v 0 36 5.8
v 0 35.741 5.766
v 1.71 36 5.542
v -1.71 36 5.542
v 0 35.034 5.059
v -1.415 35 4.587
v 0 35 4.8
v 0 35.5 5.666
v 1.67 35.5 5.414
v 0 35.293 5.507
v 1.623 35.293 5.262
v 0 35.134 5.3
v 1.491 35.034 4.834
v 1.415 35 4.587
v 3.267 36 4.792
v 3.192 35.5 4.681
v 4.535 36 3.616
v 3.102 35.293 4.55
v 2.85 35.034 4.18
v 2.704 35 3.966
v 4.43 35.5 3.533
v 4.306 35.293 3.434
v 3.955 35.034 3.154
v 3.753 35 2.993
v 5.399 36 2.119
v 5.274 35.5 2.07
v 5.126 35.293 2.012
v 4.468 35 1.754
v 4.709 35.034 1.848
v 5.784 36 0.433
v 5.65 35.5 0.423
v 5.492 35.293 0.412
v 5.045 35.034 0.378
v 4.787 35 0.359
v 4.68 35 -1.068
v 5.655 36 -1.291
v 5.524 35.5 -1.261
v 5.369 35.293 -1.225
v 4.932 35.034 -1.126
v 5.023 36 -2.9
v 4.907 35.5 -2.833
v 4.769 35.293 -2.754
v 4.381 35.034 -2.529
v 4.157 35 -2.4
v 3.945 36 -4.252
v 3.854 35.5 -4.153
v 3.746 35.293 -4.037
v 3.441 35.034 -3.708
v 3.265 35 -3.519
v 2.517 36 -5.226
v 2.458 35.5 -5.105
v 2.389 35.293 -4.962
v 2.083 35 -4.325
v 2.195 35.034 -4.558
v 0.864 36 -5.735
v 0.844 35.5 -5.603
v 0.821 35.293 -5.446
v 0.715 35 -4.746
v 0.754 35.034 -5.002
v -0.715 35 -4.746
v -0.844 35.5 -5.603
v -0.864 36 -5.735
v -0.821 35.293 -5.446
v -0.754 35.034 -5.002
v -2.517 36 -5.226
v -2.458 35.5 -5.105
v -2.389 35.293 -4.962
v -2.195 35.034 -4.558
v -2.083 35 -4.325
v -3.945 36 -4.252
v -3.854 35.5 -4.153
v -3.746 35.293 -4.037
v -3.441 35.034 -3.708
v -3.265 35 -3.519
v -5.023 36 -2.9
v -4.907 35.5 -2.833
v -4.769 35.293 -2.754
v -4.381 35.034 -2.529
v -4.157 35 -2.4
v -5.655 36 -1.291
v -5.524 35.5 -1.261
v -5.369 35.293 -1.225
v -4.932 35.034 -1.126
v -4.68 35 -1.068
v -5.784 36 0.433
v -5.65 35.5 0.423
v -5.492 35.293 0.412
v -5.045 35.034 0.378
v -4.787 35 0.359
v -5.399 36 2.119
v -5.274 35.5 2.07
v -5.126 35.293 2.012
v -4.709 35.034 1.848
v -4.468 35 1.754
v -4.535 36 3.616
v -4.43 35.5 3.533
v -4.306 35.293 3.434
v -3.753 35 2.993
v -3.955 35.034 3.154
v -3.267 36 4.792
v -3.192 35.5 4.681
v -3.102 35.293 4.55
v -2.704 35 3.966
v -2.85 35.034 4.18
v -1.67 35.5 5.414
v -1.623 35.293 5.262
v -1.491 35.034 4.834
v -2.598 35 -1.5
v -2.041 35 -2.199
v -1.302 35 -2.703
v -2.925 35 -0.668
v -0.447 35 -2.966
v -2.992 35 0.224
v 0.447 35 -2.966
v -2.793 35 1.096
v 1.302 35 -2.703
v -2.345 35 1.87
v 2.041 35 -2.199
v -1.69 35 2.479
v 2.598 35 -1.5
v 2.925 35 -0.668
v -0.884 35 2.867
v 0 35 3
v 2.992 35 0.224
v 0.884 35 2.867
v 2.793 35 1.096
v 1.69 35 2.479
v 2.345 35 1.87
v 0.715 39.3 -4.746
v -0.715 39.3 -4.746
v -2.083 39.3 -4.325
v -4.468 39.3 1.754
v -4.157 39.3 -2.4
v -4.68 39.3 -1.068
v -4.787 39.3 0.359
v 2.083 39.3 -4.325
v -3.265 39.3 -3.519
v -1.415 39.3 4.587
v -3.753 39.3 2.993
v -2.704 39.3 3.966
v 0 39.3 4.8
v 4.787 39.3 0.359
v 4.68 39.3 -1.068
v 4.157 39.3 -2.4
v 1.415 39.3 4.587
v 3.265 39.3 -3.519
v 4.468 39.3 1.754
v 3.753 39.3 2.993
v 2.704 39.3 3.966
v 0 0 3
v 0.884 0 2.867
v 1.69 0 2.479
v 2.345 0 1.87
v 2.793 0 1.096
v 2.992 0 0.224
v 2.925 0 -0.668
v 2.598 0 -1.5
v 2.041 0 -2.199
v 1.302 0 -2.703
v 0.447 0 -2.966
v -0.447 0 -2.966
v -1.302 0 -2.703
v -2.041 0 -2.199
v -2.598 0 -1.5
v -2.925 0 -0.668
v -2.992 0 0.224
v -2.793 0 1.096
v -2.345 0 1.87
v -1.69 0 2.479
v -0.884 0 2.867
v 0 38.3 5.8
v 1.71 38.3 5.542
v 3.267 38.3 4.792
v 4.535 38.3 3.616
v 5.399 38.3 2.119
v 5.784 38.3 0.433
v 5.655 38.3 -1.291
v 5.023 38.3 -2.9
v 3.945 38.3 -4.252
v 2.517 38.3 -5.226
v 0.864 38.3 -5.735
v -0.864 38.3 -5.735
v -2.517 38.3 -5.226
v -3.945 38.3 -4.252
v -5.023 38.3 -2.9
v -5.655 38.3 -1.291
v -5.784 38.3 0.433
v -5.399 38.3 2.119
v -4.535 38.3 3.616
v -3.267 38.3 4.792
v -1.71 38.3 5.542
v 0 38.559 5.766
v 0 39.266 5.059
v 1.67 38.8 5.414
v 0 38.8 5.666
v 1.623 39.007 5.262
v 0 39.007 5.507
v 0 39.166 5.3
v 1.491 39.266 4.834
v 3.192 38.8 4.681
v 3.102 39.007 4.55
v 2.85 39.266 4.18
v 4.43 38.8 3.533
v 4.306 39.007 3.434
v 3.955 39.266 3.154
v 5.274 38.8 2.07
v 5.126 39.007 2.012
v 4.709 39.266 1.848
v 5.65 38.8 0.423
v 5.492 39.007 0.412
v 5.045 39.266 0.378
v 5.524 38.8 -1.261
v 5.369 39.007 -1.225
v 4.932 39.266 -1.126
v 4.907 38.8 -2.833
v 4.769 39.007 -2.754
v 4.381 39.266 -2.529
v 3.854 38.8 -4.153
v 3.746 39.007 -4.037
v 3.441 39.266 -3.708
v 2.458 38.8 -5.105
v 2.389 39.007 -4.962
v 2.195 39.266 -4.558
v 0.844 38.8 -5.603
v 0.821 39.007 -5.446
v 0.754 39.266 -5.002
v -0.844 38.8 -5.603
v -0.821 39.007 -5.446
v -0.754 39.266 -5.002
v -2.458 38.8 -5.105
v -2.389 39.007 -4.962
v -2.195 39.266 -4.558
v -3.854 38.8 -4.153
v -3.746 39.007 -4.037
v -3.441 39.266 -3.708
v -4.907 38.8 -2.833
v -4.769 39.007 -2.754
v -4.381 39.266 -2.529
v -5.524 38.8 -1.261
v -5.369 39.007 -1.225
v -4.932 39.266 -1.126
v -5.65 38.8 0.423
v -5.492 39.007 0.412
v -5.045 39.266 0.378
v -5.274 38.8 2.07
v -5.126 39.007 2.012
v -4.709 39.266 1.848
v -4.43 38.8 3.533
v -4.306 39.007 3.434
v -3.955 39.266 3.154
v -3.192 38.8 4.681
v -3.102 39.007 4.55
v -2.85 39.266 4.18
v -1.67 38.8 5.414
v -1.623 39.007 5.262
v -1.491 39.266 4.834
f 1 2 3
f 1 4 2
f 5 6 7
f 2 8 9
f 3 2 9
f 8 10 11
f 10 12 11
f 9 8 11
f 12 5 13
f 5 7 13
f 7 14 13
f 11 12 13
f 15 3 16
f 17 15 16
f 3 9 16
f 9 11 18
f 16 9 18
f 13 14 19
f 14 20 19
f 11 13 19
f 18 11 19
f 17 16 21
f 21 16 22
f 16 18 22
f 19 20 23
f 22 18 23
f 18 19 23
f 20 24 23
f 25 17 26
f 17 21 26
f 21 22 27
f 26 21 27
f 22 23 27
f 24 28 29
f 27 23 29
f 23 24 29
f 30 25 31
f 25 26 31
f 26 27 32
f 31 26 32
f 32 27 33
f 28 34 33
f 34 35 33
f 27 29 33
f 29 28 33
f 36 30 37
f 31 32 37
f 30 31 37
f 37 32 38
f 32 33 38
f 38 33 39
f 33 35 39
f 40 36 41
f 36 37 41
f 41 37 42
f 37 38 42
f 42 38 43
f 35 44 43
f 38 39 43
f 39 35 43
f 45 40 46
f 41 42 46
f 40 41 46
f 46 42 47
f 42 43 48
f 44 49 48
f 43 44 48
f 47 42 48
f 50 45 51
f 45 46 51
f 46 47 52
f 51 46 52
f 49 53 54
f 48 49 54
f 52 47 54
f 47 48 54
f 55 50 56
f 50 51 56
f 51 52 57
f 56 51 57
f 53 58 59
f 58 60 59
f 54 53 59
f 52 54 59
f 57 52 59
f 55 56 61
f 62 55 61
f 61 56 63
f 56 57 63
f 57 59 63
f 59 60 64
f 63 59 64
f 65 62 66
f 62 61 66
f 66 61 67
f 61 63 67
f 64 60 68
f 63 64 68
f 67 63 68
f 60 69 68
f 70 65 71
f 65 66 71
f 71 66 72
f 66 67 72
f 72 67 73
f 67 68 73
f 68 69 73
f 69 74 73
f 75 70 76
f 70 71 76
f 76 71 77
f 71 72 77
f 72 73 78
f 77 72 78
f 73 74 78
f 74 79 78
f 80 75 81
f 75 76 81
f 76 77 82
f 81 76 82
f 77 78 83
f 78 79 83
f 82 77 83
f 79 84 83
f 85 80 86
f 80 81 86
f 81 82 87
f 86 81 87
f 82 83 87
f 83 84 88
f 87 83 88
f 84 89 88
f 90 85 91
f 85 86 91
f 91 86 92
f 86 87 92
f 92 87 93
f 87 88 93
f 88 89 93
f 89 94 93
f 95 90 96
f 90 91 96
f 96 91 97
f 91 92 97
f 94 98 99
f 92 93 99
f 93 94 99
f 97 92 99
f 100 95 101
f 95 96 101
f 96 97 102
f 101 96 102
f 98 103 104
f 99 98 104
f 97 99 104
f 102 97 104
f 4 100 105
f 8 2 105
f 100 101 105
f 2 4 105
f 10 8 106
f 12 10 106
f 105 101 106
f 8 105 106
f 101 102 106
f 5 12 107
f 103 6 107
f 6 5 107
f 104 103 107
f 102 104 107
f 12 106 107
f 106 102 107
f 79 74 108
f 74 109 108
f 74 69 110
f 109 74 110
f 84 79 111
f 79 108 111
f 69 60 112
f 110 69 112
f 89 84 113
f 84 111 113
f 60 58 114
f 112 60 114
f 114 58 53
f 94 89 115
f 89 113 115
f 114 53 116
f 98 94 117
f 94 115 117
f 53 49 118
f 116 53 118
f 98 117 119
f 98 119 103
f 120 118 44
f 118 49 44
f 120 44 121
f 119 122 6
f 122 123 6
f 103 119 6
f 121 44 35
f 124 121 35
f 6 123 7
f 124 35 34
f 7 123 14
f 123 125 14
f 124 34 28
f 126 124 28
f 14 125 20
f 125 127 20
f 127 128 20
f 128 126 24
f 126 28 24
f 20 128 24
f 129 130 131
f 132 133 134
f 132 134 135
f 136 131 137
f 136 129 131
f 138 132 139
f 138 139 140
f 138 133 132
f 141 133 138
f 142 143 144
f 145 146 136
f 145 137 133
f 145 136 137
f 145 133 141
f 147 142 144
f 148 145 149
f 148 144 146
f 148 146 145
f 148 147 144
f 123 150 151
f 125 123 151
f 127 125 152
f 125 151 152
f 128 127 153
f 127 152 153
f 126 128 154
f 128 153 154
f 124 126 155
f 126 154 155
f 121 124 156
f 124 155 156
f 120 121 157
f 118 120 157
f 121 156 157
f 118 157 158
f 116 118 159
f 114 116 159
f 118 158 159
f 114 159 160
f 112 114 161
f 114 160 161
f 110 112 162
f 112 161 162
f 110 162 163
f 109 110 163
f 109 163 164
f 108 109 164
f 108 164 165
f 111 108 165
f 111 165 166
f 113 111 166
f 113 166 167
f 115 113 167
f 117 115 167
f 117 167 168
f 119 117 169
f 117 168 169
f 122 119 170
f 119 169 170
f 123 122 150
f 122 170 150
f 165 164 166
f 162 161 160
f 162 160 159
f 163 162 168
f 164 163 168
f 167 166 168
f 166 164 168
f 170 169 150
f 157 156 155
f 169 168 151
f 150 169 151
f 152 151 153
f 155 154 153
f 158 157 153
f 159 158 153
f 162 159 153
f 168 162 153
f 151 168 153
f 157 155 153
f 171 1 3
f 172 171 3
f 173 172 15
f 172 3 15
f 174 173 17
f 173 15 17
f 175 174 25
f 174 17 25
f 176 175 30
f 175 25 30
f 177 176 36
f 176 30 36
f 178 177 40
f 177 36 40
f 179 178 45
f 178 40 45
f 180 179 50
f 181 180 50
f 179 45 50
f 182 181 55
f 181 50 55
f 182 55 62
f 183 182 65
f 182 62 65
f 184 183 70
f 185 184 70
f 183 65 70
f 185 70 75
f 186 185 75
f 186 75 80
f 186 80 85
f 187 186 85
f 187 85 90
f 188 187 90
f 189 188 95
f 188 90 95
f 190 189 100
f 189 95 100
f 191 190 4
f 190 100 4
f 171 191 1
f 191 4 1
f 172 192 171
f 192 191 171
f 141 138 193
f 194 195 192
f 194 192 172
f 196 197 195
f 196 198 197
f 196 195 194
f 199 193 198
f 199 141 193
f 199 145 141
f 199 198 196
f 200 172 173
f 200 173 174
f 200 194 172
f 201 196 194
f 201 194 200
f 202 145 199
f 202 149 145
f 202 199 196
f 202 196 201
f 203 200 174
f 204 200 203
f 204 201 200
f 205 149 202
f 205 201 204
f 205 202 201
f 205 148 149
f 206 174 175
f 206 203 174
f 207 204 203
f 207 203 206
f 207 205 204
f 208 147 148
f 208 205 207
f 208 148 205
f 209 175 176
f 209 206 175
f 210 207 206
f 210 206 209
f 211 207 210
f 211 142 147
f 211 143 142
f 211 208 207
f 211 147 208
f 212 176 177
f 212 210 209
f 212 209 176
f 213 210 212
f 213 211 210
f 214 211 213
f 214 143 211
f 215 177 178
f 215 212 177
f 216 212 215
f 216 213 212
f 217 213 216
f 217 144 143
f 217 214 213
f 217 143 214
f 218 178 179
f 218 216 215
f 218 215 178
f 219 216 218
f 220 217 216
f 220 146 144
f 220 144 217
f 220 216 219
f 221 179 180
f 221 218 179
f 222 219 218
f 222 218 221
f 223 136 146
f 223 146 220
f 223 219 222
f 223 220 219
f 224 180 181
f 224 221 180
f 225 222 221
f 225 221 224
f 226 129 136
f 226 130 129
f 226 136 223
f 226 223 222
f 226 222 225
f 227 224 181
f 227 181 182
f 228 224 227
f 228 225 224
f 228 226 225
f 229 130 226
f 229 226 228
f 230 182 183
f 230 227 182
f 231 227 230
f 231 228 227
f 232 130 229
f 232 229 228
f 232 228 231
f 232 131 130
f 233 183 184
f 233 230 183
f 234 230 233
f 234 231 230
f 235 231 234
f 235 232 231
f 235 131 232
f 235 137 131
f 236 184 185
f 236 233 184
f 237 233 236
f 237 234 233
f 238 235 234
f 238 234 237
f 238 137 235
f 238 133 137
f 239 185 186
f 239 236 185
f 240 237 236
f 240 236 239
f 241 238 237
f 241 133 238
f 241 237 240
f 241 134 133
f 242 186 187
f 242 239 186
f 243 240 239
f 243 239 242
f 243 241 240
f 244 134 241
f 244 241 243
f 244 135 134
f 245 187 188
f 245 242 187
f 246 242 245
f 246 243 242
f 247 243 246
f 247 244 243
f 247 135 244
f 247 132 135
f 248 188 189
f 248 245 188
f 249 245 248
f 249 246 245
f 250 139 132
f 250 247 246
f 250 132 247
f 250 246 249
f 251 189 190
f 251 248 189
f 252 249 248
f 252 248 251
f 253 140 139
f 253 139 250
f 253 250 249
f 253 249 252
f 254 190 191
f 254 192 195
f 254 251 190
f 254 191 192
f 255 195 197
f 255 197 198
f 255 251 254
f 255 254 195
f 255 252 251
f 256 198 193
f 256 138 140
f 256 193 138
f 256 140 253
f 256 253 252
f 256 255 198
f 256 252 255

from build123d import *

# Parameters (mm, degrees)
SKETCH1_R           = 3
BOSS_EXTRUDE1_DEPTH = 35
SKETCH2_R           = 5.8
BOSS_EXTRUDE2_DEPTH = 4.3
FILLET1_R           = 1


with BuildPart() as part:
    # Sketch1 → Boss-Extrude1 (new body)
    with BuildSketch(Plane(origin=(0, 0, 0), x_dir=(1, 0, 0), z_dir=(0, 1, 0))):
        with Locations(Location((0, 0, 0), (0, 0, 270))):  # turned: the seam where the file's is
            Circle(SKETCH1_R)
    extrude(amount=BOSS_EXTRUDE1_DEPTH)

    # Sketch2 → Boss-Extrude2 (add)
    with BuildSketch(Plane(origin=(0, 35, 0), x_dir=(1, 0, 0), z_dir=(0, 1, 0))):
        with Locations(Location((0, 0, 0), (0, 0, 270))):  # turned: the seam where the file's is
            Circle(SKETCH2_R)
    extrude(amount=BOSS_EXTRUDE2_DEPTH)

    # Fillet1
    fillet1_edges = [part.edges().sort_by_distance(p)[0] for p in [
        (0, 35, -5.8),
        (0, 39.3, -5.8),
    ]]
    fillet(fillet1_edges, radius=FILLET1_R)


solid = part.part
